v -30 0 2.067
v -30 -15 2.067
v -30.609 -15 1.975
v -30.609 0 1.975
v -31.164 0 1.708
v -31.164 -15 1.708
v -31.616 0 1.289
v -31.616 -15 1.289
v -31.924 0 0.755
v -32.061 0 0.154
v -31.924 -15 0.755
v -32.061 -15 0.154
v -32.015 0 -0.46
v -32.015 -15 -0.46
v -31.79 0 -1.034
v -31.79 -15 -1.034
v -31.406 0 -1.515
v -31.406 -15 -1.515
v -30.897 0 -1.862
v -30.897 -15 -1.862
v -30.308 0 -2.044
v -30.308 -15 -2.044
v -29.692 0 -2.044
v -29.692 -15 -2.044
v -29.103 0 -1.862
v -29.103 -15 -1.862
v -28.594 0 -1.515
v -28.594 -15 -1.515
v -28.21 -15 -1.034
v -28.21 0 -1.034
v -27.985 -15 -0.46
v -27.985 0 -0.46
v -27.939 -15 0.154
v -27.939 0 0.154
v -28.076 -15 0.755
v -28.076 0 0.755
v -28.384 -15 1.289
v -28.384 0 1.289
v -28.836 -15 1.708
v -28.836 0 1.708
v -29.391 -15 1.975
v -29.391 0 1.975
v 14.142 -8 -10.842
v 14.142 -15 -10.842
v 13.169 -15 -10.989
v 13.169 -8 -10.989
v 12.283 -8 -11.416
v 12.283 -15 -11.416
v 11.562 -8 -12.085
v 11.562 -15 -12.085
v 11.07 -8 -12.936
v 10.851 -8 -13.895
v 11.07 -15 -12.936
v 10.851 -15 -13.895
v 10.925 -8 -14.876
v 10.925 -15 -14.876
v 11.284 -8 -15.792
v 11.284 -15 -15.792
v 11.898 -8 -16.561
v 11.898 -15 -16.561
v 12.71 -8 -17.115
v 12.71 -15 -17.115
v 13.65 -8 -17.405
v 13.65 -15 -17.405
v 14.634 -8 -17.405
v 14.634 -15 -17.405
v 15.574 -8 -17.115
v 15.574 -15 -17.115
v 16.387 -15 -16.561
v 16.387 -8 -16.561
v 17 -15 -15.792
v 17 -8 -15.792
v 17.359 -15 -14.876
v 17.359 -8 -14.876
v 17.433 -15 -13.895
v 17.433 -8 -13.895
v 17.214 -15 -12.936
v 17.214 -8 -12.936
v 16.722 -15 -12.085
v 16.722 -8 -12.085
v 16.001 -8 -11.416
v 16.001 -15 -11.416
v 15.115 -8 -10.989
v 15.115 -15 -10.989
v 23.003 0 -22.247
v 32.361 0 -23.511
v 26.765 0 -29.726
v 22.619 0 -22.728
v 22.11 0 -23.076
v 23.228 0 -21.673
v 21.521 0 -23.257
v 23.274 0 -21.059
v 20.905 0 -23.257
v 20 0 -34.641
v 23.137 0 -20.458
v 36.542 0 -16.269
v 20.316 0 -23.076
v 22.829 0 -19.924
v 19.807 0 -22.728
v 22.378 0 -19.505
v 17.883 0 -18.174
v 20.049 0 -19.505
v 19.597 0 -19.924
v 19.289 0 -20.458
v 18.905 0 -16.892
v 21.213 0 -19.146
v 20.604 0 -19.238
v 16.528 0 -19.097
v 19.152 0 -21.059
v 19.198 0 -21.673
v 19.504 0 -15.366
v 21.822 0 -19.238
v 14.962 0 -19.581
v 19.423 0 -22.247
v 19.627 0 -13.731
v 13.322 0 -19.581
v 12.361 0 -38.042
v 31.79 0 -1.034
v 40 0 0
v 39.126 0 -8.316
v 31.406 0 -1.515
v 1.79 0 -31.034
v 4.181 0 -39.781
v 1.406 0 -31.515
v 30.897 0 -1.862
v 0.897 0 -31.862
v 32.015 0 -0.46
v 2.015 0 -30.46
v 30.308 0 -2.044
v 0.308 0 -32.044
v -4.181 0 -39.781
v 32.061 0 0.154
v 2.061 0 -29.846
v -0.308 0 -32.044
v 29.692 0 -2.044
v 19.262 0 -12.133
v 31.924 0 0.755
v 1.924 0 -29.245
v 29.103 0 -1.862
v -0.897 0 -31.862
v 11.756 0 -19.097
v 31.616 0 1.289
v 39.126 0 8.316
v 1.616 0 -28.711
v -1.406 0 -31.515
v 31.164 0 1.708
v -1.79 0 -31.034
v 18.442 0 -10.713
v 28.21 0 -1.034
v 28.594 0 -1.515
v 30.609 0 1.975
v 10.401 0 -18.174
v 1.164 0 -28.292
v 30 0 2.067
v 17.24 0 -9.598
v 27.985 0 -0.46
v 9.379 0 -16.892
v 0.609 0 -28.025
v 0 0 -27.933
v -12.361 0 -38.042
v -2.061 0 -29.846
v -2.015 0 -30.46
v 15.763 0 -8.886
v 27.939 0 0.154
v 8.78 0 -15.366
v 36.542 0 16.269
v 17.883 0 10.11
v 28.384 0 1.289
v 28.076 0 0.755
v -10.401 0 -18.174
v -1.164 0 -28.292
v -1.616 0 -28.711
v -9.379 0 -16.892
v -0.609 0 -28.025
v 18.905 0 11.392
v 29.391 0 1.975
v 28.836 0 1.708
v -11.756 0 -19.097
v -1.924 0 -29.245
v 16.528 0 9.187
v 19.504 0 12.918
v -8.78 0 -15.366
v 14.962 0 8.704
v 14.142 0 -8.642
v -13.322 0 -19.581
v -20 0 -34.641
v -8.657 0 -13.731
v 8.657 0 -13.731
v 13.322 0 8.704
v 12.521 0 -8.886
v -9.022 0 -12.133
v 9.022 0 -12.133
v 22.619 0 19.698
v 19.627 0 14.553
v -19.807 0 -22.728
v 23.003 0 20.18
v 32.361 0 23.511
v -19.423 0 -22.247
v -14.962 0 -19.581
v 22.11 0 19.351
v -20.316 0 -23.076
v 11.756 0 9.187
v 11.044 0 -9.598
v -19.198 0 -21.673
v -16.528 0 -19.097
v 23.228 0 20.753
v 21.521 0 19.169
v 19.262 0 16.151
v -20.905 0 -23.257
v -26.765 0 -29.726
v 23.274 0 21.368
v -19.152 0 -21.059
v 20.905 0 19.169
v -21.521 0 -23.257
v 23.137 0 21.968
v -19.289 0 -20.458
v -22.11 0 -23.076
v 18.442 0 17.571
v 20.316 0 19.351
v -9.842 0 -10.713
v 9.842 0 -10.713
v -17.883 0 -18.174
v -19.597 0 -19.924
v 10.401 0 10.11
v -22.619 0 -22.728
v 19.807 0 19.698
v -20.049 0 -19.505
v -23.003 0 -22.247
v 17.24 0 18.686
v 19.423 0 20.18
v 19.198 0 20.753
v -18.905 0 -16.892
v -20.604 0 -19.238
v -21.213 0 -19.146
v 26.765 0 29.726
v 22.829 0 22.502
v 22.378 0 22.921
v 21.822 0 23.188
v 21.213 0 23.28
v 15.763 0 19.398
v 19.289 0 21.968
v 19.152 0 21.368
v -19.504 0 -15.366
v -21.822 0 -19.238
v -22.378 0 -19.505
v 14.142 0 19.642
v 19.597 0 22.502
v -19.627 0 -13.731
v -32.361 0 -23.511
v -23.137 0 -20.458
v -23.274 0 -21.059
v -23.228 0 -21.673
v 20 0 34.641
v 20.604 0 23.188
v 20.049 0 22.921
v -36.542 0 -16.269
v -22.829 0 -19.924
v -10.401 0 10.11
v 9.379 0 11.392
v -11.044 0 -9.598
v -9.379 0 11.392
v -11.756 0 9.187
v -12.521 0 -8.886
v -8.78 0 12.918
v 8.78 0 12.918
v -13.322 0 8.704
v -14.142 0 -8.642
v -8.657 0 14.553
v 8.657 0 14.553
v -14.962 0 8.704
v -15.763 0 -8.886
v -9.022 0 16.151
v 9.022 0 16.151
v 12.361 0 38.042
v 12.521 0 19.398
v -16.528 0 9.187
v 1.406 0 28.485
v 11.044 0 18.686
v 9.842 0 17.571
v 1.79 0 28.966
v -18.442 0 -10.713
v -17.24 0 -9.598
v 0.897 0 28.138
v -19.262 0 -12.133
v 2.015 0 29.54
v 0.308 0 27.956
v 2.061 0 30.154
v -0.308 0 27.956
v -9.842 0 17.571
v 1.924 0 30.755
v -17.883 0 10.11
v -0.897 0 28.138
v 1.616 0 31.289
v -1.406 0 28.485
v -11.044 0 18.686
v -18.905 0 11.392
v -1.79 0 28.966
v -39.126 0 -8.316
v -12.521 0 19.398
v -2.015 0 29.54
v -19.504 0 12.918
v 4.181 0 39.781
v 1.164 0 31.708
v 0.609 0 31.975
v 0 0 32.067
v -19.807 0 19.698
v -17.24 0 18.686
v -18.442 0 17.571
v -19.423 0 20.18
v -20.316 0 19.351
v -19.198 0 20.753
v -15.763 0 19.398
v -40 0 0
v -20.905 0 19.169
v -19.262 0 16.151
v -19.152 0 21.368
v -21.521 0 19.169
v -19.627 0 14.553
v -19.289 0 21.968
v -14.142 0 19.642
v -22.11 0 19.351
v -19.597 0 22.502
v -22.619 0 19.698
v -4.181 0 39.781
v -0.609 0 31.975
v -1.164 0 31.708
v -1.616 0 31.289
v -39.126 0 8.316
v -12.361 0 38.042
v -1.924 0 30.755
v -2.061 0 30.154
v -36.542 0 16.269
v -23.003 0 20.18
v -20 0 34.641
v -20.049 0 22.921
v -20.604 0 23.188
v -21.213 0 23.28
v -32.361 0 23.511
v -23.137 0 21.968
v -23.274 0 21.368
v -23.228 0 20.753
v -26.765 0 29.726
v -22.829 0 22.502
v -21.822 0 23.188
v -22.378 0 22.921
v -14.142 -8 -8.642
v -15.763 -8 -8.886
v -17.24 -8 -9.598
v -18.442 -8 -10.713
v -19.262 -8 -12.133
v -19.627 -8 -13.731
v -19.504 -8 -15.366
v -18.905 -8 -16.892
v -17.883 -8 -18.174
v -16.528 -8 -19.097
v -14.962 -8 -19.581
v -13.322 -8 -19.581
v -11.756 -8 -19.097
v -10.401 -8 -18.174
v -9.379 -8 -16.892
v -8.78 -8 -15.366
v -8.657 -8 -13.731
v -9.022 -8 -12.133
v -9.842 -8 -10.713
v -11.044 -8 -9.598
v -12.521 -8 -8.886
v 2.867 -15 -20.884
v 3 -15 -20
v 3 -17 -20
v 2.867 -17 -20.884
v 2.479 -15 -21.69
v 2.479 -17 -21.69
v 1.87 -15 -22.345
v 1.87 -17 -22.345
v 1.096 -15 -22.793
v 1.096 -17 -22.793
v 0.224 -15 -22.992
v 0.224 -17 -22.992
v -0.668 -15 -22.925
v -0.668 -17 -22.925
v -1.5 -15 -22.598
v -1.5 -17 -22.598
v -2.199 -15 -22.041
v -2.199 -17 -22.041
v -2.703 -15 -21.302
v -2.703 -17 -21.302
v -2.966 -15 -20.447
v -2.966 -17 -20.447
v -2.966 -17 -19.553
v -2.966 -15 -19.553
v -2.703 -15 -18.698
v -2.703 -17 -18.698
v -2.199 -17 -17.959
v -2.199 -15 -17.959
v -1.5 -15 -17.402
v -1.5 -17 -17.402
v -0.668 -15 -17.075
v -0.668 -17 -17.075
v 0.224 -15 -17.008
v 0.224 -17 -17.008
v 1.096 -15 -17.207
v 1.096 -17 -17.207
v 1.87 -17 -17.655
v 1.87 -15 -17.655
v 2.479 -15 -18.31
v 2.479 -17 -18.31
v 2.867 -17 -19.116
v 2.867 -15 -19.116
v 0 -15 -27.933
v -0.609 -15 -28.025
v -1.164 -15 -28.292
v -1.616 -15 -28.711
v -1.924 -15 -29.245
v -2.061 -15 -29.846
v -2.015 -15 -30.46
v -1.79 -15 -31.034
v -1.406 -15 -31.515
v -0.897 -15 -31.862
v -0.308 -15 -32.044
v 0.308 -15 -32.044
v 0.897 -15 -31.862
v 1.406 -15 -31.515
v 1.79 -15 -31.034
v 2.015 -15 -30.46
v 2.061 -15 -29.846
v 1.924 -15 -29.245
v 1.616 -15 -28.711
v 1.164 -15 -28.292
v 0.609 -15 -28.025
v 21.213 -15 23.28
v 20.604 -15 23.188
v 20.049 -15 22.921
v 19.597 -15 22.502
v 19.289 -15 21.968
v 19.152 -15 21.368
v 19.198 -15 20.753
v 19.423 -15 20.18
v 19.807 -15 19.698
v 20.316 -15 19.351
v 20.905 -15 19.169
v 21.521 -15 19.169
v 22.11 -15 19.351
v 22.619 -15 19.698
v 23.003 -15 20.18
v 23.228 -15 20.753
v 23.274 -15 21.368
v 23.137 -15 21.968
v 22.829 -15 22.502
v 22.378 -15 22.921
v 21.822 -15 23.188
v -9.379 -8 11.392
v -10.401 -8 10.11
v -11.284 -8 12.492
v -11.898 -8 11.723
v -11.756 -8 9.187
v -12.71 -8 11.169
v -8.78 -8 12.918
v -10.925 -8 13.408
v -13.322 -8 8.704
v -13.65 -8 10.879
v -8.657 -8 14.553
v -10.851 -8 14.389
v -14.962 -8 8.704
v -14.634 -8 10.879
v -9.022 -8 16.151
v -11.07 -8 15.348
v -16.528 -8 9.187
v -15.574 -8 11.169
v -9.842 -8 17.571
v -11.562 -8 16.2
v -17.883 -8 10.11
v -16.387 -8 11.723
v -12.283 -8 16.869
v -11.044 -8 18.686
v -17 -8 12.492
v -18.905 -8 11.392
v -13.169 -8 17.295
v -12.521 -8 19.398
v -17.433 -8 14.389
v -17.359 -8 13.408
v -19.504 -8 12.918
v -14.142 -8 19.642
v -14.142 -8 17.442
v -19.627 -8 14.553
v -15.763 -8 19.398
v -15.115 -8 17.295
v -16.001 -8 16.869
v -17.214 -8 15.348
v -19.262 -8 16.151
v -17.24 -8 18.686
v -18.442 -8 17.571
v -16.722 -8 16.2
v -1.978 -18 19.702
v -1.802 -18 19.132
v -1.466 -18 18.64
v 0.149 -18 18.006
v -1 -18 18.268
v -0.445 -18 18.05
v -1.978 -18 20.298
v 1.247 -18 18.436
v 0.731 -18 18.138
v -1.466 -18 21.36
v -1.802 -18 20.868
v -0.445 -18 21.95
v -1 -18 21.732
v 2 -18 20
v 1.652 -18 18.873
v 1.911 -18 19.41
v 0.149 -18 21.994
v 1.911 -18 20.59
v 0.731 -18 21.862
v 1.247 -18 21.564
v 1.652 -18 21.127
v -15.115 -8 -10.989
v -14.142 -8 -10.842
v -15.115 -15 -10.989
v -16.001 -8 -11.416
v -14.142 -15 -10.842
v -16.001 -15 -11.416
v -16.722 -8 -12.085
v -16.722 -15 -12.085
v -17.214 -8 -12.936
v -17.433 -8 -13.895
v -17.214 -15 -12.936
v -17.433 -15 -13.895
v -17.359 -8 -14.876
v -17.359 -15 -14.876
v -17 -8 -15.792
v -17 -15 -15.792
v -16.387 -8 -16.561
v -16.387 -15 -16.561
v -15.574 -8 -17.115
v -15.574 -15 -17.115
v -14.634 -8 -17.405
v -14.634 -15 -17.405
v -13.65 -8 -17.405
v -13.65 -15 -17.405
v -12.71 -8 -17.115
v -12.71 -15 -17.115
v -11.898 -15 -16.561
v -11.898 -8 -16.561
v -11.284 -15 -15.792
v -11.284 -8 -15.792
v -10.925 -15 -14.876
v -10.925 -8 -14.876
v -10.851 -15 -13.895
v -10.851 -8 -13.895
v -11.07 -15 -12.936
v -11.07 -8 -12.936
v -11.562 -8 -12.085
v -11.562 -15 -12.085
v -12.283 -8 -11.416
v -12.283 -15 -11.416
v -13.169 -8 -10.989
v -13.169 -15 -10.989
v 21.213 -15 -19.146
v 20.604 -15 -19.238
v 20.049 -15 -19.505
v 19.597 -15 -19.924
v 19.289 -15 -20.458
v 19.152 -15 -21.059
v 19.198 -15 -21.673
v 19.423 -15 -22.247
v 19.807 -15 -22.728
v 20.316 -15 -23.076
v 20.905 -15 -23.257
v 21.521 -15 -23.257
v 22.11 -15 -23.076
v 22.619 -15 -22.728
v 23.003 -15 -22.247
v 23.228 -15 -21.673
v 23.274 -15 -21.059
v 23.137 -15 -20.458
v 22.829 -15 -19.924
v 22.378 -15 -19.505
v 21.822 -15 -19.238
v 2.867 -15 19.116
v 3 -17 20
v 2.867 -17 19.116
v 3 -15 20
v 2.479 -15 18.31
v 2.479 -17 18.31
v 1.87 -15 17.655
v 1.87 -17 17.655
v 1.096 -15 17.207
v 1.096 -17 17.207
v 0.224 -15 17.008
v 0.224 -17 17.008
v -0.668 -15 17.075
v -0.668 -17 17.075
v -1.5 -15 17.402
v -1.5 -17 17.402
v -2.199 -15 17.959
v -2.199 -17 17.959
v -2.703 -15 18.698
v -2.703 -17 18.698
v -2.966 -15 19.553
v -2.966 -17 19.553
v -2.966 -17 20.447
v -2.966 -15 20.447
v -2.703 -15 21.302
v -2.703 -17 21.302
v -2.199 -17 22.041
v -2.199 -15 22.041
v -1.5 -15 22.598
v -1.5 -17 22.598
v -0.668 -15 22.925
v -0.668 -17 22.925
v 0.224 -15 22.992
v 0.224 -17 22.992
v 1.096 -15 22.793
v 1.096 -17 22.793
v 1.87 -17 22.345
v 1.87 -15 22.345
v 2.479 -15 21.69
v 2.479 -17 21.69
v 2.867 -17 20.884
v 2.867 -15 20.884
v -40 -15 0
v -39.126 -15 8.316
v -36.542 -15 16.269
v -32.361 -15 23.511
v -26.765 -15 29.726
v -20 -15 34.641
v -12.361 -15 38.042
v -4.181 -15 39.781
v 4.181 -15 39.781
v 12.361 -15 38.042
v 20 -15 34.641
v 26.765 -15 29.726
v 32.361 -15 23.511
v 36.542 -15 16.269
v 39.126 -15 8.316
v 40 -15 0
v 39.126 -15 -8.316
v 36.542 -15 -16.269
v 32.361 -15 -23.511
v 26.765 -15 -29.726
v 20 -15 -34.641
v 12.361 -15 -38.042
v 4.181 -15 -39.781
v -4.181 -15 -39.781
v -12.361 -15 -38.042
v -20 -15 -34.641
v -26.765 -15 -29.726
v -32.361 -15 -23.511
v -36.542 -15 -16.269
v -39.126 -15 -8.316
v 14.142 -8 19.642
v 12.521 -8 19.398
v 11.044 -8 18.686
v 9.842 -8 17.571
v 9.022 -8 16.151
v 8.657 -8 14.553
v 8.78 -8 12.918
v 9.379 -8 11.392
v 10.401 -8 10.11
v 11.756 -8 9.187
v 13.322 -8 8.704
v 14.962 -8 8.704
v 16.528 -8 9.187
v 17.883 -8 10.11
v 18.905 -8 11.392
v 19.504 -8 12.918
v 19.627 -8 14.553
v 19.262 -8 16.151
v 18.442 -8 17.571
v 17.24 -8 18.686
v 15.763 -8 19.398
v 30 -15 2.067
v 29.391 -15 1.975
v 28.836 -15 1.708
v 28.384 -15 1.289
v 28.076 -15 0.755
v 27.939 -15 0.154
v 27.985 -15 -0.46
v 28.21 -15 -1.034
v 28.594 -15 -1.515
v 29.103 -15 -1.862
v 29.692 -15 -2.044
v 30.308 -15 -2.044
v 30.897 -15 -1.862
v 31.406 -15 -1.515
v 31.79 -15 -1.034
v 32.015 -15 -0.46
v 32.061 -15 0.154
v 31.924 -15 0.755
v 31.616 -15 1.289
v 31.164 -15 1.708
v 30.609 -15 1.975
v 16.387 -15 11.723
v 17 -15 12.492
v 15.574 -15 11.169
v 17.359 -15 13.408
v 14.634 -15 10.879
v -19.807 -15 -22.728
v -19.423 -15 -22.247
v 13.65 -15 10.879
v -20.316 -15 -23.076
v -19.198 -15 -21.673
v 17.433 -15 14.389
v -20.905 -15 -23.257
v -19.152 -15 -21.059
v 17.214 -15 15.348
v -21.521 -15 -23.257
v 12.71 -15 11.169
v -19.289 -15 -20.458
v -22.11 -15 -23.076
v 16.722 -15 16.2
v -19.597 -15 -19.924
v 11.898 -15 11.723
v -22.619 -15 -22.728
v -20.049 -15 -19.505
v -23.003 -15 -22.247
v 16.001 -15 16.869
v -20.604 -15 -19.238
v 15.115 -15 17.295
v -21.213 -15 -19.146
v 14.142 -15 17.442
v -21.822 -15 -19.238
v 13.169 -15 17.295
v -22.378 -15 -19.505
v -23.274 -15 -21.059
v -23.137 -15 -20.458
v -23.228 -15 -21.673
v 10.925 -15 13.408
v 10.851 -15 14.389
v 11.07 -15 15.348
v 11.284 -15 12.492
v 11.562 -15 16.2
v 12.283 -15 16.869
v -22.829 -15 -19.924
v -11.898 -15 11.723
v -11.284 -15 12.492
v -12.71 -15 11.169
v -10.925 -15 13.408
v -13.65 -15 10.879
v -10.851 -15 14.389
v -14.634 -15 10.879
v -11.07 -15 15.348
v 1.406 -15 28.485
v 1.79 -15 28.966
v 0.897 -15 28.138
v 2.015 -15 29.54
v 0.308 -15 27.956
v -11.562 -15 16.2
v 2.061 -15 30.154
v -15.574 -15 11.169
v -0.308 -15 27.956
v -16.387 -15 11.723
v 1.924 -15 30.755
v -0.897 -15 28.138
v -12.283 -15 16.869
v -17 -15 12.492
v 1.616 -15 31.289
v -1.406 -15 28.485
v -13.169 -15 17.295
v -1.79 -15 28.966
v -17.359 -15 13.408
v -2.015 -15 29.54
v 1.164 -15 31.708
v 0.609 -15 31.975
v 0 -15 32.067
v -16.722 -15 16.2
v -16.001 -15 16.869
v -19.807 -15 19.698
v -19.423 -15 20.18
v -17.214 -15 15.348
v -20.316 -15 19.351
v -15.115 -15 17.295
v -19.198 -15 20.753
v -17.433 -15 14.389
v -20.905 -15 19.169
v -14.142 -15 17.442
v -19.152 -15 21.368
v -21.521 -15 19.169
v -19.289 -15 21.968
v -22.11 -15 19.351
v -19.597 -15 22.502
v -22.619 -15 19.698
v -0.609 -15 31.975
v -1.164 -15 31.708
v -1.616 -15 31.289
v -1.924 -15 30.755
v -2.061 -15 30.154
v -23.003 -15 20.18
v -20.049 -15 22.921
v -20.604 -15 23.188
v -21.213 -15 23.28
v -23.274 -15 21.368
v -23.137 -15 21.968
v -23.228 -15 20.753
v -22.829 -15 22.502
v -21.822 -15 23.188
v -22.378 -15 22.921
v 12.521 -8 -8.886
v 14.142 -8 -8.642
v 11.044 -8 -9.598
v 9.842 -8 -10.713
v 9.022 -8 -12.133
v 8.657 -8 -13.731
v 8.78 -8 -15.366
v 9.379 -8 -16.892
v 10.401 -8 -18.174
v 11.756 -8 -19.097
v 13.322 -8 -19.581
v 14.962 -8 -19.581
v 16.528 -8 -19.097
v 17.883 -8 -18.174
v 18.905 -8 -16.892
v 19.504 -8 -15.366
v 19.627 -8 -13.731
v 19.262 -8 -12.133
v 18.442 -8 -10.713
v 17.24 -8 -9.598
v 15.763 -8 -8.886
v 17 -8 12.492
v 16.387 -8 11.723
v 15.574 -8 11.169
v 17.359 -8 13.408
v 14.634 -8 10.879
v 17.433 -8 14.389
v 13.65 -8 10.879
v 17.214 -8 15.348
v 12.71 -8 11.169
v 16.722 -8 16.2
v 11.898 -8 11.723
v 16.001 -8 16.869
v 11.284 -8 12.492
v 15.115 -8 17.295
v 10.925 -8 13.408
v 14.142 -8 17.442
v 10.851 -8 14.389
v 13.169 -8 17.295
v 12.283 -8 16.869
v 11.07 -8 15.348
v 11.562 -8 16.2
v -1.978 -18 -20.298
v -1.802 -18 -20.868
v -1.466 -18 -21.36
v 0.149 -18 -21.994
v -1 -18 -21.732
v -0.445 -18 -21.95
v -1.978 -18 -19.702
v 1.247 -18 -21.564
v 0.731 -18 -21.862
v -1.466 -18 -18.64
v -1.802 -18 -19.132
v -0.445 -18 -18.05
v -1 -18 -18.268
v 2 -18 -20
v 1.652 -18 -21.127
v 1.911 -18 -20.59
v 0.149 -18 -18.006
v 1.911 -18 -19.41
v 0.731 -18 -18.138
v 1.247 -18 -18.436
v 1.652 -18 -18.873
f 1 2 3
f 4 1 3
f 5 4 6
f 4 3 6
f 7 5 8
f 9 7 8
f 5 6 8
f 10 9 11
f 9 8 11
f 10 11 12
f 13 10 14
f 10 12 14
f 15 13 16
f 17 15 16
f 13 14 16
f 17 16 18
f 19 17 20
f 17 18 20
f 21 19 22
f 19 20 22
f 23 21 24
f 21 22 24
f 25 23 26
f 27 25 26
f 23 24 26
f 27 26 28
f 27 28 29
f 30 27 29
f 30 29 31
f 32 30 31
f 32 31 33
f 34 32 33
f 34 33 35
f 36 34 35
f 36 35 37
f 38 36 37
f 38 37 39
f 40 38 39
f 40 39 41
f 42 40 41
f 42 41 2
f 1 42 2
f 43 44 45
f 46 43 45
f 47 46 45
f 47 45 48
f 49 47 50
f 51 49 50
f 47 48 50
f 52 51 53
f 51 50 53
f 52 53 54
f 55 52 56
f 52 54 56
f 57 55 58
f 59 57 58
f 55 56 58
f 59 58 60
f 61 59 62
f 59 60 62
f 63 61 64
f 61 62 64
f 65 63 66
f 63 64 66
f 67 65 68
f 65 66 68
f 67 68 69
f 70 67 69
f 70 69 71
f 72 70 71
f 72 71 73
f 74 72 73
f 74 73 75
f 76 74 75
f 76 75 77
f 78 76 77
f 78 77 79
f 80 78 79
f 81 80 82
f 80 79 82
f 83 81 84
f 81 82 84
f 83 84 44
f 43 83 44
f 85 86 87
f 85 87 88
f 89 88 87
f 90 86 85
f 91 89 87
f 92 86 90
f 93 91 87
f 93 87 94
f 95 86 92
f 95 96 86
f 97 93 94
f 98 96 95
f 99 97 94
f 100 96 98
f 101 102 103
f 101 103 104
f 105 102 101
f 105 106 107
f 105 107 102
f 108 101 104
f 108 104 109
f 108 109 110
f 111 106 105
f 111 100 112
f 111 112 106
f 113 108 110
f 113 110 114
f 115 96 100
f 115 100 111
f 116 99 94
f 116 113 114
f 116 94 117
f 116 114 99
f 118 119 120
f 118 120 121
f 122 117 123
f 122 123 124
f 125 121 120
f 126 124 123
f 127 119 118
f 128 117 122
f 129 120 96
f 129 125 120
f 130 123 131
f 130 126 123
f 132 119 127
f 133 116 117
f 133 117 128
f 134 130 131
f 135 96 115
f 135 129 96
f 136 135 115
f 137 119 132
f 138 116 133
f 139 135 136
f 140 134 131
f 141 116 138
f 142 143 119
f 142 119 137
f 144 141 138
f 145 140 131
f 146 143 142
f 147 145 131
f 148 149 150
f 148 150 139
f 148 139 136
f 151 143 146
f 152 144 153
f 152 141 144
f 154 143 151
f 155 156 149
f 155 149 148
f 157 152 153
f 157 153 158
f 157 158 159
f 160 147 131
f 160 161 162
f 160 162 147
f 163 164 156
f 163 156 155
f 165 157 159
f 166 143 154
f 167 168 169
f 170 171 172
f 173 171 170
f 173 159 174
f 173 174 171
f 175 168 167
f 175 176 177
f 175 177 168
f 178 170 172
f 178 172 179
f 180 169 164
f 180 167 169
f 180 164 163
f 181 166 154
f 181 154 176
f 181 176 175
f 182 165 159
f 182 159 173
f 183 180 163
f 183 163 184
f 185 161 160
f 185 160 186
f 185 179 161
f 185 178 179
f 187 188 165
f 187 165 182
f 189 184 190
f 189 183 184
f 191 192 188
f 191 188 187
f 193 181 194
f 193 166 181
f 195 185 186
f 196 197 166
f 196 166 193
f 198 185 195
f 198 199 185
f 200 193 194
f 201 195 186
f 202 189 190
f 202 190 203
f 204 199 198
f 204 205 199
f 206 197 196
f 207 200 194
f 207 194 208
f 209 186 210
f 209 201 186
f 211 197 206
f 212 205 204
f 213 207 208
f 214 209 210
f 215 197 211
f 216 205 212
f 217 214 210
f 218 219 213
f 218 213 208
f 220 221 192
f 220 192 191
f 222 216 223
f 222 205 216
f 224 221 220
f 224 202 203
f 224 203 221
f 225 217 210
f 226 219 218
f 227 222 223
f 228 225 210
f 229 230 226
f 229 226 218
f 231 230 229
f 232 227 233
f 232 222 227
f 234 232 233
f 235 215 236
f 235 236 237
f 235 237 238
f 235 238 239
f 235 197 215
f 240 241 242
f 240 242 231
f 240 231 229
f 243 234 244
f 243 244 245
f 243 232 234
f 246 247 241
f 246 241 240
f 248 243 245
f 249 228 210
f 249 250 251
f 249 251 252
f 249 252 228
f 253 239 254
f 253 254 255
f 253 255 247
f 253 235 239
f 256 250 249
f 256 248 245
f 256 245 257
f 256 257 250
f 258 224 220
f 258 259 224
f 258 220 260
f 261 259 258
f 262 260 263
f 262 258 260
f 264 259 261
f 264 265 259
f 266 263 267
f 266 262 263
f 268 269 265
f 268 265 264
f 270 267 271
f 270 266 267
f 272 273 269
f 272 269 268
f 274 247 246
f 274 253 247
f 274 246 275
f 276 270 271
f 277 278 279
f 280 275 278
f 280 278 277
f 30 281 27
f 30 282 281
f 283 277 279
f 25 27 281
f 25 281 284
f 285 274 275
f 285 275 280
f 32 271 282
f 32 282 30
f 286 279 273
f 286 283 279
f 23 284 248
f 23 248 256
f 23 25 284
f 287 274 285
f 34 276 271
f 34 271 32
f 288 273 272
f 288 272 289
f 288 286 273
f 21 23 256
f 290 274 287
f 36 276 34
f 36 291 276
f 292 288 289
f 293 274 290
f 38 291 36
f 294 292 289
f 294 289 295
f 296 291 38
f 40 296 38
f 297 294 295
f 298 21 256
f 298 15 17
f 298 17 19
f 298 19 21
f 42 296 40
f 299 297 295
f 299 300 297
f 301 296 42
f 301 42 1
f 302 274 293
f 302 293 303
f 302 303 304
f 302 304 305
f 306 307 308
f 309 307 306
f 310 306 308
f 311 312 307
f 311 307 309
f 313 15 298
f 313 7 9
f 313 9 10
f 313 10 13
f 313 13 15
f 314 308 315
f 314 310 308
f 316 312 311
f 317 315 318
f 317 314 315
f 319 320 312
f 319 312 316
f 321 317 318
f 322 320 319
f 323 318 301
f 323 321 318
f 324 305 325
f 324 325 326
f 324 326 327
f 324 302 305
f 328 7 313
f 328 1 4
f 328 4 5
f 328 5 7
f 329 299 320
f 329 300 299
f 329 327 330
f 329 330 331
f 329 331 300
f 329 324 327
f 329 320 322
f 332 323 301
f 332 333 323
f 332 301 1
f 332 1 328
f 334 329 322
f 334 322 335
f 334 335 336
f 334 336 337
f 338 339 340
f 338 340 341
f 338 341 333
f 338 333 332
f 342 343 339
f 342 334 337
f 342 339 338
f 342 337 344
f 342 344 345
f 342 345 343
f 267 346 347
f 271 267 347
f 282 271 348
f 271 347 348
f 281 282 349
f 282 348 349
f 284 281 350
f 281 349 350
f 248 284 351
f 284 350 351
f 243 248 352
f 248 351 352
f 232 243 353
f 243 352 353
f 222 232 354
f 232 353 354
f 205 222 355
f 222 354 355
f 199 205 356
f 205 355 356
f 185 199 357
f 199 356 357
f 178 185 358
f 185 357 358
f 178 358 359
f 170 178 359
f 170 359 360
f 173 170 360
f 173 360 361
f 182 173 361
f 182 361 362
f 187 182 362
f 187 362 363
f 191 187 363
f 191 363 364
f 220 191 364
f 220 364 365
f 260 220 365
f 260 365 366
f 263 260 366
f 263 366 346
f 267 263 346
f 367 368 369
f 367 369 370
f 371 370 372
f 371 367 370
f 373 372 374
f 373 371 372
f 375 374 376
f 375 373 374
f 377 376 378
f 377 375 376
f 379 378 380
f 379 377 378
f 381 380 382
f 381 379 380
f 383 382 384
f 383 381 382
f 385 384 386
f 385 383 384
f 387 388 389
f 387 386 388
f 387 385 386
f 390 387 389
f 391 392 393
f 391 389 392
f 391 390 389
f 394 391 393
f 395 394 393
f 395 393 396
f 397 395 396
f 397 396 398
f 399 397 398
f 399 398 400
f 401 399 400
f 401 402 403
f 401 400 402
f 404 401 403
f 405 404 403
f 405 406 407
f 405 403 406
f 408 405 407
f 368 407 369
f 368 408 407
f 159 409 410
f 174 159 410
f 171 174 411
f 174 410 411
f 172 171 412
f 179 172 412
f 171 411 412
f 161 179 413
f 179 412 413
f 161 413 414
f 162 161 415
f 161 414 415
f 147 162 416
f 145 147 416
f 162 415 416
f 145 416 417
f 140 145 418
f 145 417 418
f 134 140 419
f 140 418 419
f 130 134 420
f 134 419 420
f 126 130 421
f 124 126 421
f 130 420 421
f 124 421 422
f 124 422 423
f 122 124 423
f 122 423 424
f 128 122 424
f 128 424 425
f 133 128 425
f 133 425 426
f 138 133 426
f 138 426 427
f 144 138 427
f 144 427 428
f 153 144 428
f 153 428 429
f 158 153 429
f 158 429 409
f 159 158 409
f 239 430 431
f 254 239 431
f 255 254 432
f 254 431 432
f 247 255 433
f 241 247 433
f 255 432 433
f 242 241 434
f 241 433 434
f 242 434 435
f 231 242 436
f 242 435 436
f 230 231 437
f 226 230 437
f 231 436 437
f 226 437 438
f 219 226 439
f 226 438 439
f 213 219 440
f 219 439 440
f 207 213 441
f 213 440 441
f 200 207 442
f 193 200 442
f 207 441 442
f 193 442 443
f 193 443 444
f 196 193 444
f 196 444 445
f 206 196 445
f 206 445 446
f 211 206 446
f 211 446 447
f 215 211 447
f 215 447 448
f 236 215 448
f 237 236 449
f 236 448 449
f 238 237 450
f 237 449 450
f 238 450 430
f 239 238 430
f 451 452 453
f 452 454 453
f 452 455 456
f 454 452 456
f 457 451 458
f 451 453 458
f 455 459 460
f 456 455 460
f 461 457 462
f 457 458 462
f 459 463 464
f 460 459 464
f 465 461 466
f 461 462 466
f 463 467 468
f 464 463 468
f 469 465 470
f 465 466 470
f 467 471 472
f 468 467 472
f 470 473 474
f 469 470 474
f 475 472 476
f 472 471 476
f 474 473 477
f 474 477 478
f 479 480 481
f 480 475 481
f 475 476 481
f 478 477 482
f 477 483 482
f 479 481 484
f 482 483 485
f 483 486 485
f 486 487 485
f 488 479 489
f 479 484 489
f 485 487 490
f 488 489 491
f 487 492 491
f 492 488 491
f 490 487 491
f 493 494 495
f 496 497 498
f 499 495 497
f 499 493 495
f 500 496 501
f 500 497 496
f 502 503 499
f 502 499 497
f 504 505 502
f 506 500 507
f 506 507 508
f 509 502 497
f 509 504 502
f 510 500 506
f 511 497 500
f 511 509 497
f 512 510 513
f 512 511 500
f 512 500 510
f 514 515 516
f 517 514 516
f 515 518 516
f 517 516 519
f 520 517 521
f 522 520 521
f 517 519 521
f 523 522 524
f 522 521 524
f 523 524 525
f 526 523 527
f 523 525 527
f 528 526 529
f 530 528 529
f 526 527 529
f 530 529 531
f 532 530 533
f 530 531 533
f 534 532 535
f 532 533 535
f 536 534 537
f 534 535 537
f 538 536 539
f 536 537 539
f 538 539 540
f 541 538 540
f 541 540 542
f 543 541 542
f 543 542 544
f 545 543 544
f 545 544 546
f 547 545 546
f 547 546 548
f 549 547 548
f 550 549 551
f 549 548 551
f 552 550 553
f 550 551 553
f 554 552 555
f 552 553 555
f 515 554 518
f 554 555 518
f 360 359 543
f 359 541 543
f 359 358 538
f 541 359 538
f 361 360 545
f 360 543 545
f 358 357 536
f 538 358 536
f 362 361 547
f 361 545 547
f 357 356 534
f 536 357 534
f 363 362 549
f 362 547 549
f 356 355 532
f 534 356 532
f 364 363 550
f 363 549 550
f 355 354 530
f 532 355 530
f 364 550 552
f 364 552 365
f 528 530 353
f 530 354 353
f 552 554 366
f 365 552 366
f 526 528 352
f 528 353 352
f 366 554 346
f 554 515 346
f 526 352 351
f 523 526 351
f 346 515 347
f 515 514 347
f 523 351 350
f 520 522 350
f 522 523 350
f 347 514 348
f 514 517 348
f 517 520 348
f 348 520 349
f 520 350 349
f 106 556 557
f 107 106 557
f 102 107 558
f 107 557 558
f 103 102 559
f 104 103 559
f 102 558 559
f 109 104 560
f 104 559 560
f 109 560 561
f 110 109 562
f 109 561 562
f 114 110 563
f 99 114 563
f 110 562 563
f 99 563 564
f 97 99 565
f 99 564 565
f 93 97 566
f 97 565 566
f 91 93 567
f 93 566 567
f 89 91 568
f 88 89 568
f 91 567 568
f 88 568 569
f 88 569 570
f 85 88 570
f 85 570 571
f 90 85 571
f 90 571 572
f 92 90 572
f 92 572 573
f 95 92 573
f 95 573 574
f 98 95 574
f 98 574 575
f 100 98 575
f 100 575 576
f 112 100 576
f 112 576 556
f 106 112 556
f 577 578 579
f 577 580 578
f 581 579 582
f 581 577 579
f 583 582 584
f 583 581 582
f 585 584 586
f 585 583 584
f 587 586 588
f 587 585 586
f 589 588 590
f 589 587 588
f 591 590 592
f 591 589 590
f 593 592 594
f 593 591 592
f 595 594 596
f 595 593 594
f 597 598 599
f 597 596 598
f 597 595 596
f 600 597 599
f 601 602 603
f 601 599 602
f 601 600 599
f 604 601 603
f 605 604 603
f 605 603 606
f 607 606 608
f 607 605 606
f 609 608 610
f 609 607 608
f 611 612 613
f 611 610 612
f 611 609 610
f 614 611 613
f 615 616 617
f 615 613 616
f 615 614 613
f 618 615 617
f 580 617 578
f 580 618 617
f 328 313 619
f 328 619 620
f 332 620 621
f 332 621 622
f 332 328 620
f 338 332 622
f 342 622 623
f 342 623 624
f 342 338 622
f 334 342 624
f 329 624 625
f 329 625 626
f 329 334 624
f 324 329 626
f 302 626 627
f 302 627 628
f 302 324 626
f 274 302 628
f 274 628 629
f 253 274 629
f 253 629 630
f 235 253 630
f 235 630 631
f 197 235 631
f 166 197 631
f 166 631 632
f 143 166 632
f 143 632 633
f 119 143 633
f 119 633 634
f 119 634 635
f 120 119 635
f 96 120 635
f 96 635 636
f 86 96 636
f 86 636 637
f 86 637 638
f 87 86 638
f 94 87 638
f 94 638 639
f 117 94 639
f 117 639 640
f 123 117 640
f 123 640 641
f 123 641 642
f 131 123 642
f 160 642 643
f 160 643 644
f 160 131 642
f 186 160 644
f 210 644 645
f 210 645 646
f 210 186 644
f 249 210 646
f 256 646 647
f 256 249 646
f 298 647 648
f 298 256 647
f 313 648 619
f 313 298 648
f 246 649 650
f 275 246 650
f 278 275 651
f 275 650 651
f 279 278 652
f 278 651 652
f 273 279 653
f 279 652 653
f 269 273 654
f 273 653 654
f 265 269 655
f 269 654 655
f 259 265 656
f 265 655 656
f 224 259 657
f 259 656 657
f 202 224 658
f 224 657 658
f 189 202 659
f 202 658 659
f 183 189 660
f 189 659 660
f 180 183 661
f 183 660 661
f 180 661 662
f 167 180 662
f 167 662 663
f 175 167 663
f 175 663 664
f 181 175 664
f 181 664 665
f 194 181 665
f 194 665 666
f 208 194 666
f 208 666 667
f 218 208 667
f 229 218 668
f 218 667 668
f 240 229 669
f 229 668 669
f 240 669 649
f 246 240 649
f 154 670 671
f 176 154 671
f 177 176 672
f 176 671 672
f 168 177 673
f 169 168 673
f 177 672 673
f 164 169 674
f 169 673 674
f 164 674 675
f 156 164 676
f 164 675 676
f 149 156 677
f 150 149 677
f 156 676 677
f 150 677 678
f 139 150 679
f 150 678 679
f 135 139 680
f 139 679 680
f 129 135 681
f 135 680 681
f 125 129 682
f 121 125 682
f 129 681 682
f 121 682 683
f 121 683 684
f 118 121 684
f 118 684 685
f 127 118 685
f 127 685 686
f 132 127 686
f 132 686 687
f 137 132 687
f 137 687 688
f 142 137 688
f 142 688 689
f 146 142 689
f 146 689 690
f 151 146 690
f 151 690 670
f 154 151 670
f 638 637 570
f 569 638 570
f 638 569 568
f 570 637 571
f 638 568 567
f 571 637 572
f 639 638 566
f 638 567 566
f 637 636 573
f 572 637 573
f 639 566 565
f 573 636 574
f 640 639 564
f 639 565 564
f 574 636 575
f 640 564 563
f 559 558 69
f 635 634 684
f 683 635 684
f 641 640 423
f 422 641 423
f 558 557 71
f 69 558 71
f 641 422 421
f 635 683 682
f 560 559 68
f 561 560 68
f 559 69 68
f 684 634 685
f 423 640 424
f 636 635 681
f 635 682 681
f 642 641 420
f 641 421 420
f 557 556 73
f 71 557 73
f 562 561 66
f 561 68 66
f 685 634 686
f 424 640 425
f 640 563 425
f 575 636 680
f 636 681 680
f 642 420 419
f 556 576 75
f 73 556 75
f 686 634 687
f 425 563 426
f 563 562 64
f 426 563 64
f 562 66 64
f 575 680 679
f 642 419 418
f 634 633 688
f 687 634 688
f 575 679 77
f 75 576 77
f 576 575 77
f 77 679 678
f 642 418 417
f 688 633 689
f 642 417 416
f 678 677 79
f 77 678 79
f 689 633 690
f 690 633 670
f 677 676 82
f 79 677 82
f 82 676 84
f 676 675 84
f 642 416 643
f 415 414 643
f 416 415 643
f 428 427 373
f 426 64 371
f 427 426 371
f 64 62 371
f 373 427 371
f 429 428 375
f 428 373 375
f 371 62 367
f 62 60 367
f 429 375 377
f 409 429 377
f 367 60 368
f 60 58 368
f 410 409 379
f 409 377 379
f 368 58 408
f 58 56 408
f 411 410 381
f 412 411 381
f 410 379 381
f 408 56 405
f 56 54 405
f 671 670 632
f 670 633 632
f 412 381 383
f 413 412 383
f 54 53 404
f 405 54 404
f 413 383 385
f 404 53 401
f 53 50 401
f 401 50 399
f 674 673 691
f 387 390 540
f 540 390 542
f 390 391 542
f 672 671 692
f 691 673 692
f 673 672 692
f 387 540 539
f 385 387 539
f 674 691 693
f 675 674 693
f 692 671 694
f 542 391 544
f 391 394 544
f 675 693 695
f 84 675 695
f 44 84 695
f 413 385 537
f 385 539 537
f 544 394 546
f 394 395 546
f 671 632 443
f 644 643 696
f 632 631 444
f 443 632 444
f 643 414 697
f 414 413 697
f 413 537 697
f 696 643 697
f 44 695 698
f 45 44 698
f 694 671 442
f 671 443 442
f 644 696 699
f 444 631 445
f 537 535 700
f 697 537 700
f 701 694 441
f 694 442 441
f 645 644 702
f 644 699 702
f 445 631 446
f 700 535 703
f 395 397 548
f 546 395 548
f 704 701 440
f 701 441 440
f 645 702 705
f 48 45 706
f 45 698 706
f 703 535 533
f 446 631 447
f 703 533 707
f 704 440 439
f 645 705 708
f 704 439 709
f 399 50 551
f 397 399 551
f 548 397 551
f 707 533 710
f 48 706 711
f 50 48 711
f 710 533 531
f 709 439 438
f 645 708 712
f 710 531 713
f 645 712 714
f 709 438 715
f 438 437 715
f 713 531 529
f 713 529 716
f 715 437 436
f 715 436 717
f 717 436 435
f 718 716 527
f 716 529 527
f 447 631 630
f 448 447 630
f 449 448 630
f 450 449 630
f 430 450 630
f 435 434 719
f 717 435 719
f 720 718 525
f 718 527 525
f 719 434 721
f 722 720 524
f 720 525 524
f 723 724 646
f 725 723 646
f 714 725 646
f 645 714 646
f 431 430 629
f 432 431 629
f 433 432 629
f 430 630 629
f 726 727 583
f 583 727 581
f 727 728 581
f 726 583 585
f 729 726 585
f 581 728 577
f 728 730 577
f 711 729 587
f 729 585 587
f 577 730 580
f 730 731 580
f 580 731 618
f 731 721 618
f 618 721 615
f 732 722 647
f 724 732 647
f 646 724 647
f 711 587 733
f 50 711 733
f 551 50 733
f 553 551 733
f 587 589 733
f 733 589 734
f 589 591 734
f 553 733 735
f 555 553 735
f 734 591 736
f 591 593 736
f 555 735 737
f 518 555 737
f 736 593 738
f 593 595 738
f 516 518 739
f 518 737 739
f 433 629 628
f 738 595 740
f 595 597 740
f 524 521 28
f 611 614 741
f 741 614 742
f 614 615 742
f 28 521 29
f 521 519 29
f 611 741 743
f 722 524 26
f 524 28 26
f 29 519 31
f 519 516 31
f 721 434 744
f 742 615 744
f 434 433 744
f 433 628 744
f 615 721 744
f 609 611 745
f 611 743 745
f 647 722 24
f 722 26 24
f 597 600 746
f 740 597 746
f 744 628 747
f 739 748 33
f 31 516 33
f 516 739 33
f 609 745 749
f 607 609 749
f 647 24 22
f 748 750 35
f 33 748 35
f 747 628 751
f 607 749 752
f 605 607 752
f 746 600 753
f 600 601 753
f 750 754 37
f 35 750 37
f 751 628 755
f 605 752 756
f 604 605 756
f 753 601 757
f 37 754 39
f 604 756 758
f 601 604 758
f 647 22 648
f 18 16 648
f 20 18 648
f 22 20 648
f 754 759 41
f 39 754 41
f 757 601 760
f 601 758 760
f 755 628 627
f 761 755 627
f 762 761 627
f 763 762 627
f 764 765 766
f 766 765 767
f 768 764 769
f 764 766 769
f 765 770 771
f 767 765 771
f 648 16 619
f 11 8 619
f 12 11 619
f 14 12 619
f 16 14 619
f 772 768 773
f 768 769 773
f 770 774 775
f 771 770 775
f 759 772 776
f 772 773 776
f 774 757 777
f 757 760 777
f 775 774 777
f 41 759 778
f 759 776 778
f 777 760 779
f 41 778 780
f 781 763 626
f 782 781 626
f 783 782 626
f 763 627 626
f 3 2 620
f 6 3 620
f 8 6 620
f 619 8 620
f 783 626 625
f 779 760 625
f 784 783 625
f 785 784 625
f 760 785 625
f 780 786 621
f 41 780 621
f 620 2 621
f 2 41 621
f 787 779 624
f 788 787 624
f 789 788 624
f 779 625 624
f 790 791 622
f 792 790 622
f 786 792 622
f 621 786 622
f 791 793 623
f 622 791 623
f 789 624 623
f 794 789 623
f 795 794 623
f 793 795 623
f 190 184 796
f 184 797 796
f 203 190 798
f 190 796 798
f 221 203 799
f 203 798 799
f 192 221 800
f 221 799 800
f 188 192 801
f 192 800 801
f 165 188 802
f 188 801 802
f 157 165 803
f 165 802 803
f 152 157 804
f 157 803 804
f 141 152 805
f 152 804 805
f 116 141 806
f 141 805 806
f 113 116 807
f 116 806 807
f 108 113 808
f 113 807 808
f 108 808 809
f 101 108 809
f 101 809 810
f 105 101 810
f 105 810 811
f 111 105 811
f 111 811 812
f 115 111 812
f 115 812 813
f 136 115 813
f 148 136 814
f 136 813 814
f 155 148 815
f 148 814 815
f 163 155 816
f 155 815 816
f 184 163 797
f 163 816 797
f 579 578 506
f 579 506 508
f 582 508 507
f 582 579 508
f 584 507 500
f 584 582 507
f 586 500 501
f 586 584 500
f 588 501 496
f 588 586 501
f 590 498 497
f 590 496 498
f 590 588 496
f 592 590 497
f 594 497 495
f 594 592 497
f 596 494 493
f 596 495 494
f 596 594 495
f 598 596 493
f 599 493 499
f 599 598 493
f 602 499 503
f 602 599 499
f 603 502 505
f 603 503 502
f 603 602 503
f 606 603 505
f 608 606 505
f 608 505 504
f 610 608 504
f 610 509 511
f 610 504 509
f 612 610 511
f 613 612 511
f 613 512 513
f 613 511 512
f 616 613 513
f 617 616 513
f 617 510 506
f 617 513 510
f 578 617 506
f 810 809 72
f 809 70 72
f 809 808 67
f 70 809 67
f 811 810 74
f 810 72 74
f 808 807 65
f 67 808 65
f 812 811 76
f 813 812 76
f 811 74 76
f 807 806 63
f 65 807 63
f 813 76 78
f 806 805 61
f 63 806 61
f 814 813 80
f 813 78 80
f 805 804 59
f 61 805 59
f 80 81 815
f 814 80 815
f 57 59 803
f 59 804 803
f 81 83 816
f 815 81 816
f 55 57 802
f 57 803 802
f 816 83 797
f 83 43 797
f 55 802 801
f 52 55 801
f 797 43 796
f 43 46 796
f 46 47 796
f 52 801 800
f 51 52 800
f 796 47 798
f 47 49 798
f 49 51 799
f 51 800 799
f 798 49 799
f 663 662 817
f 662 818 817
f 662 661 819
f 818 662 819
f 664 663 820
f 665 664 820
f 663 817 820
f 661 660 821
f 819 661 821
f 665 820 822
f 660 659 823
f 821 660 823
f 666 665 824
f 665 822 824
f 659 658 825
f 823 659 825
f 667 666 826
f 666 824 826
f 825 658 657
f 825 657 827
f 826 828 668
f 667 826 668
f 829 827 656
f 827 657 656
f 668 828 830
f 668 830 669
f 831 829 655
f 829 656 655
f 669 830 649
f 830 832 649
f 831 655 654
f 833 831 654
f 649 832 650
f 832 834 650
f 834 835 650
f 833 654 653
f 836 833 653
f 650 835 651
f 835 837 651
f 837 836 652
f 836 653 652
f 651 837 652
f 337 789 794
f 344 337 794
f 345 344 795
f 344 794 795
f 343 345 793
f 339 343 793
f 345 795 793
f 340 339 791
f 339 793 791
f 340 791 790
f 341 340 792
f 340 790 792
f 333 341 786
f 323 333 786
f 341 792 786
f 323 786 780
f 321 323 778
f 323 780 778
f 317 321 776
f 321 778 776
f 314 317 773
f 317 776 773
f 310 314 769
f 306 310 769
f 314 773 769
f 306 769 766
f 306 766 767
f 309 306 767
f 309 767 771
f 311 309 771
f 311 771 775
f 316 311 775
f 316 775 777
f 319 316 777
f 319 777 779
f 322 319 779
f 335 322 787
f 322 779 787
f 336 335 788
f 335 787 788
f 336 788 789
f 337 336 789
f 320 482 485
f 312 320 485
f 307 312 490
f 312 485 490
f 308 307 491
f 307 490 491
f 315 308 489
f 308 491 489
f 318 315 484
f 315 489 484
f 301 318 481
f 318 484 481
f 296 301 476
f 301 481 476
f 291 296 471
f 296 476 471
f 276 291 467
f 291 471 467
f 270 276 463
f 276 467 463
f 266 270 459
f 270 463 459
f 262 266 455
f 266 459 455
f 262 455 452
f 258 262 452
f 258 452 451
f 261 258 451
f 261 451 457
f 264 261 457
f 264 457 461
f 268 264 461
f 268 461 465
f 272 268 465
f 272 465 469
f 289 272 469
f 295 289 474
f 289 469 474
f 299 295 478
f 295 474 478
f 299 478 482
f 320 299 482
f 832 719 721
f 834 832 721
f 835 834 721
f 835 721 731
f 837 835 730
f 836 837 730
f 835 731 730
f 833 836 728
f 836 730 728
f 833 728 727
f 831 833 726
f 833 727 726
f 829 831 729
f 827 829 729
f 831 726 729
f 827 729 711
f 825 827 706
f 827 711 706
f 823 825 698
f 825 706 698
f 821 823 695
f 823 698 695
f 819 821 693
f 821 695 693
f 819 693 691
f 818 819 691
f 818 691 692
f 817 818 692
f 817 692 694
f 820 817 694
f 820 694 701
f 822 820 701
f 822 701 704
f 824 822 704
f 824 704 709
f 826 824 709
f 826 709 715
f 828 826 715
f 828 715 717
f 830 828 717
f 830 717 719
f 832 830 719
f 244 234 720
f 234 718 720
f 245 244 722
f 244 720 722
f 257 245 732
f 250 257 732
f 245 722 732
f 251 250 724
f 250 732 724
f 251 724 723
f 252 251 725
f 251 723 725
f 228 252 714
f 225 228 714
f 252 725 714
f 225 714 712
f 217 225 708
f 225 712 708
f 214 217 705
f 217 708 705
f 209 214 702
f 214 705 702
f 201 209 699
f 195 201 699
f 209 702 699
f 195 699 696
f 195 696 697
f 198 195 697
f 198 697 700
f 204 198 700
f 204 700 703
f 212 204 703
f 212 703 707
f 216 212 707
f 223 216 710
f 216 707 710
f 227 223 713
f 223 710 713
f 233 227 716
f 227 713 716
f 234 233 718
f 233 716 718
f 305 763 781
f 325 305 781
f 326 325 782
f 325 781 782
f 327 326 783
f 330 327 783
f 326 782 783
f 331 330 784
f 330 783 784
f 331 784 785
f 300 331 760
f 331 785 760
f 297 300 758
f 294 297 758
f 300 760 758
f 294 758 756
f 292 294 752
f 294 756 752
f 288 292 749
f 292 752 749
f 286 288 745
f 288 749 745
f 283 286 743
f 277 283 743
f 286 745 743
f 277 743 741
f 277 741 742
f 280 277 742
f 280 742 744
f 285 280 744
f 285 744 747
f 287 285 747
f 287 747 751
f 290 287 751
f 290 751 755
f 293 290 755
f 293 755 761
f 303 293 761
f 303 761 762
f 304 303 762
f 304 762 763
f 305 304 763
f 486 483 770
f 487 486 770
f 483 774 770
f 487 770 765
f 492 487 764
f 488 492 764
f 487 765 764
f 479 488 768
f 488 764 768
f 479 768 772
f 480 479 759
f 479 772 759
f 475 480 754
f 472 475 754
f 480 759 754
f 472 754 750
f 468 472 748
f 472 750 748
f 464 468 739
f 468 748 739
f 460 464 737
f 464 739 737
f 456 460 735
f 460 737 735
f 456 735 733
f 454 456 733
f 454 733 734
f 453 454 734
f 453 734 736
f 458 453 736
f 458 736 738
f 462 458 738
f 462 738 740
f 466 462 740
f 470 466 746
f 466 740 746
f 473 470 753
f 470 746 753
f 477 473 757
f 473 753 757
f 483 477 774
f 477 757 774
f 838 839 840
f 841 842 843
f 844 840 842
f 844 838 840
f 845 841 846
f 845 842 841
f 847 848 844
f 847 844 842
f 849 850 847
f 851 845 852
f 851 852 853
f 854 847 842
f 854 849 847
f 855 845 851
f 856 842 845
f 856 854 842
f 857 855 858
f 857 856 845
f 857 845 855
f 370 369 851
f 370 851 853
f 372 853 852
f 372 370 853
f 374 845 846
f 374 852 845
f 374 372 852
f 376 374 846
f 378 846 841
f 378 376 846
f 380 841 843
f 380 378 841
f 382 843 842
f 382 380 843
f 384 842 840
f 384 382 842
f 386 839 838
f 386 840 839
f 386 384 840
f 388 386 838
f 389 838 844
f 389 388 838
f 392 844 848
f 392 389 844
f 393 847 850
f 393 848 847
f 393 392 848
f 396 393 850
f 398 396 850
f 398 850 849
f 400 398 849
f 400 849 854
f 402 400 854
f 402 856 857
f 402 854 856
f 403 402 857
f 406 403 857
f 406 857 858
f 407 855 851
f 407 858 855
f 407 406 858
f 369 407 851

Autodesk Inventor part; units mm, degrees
ref_plane "YZ Plane" through (0, 0, 0) normal (1, 0, 0) x (0, 1, 0)
ref_plane "XZ Plane" through (0, 0, 0) normal (0, 1, 0) x (-1, 0, 0)
ref_plane "XY Plane" through (0, 0, 0) normal (0, 0, 1) x (1, 0, 0)
sketch "Sketch1" plane through (0, 0, 0) normal (0, 1, 0) x (-1, 0, 0)
  circle A0 centre (0, 0) radius 40
  point P0 (20, 0)
  point P1 (14.1421, 14.1421)
  point P2 (0, 20)
  point P3 (-14.1421, 14.1421)
  point P4 (-20, 0)
  point P5 (-14.1421, -14.1421)
  point P6 (0, -20)
  point P7 (14.1421, -14.1421)
  point P8 (30, 0)
  point P9 (21.2132, 21.2132)
  point P10 (0, 30)
  point P11 (-21.2132, 21.2132)
  point P12 (-30, 0)
  point P13 (-21.2132, -21.2132)
  point P14 (0, -30)
  point P15 (21.2132, -21.2132)
  dimension "d0" = 80
  dimension "d2" = 20
  dimension "d5" = 360
  dimension "d31" = 30
  dimension "d34" = 360
extrude "Extrusion1" add sketch "Sketch1" against normal blind 15
hole "Hole1" at (-14.1421, 0, 14.1421) at (-14.1421, 0, -14.1421) at (14.1421, 0, 14.1421) at (14.1421, 0, -14.1421) direction (0, -1, 0) diameter 6.6 end through all counterbore diameter 11 counterbore depth 8 clearance for "Socket Head Cap Screw" size "M6" standard "Ansi Metric M Profile"
sketch "Sketch2" plane through (0, -15, 0) normal (0, -1, 0) x (1, 0, 0)
  circle A0 centre (0, 0) radius 40
  circle A1 centre (0, 20) radius 3
  circle A2 centre (0, -20) radius 3
  point P0 (20, 0)
  point P1 (14.1421, 14.1421)
  point P2 (-14.1421, 14.1421)
  point P3 (-20, 0)
  point P4 (-14.1421, -14.1421)
  point P5 (14.1421, -14.1421)
  dimension "d18" = 80
  dimension "d19" = 20
  dimension "d20" = 360
  dimension "d21" = 6
  dimension "d22" = 6
extrude "Extrusion2" add sketch "Sketch2" along normal blind 3 contours A1 | A2
chamfer "Chamfer1" distance 1 angle 45 1 edges at (-3, -18, -20)
chamfer "Chamfer2" distance 1 angle 45 1 edges at (-3, -18, 20)
hole "Hole2" at (-30, 0, 0) at (-21.2132, 0, 21.2132) at (0, 0, 30) at (21.2132, 0, 21.2132) at (30, 0, 0) at (21.2132, 0, -21.2132) at (0, 0, -30) at (-21.2132, 0, -21.2132) direction (0, -1, 0) diameter 4.134 end through all thread size "M5x0.8" class "6H" standard "ANSI Metric M Profile"
properties part number "plate_for_CFS055CA501U"
